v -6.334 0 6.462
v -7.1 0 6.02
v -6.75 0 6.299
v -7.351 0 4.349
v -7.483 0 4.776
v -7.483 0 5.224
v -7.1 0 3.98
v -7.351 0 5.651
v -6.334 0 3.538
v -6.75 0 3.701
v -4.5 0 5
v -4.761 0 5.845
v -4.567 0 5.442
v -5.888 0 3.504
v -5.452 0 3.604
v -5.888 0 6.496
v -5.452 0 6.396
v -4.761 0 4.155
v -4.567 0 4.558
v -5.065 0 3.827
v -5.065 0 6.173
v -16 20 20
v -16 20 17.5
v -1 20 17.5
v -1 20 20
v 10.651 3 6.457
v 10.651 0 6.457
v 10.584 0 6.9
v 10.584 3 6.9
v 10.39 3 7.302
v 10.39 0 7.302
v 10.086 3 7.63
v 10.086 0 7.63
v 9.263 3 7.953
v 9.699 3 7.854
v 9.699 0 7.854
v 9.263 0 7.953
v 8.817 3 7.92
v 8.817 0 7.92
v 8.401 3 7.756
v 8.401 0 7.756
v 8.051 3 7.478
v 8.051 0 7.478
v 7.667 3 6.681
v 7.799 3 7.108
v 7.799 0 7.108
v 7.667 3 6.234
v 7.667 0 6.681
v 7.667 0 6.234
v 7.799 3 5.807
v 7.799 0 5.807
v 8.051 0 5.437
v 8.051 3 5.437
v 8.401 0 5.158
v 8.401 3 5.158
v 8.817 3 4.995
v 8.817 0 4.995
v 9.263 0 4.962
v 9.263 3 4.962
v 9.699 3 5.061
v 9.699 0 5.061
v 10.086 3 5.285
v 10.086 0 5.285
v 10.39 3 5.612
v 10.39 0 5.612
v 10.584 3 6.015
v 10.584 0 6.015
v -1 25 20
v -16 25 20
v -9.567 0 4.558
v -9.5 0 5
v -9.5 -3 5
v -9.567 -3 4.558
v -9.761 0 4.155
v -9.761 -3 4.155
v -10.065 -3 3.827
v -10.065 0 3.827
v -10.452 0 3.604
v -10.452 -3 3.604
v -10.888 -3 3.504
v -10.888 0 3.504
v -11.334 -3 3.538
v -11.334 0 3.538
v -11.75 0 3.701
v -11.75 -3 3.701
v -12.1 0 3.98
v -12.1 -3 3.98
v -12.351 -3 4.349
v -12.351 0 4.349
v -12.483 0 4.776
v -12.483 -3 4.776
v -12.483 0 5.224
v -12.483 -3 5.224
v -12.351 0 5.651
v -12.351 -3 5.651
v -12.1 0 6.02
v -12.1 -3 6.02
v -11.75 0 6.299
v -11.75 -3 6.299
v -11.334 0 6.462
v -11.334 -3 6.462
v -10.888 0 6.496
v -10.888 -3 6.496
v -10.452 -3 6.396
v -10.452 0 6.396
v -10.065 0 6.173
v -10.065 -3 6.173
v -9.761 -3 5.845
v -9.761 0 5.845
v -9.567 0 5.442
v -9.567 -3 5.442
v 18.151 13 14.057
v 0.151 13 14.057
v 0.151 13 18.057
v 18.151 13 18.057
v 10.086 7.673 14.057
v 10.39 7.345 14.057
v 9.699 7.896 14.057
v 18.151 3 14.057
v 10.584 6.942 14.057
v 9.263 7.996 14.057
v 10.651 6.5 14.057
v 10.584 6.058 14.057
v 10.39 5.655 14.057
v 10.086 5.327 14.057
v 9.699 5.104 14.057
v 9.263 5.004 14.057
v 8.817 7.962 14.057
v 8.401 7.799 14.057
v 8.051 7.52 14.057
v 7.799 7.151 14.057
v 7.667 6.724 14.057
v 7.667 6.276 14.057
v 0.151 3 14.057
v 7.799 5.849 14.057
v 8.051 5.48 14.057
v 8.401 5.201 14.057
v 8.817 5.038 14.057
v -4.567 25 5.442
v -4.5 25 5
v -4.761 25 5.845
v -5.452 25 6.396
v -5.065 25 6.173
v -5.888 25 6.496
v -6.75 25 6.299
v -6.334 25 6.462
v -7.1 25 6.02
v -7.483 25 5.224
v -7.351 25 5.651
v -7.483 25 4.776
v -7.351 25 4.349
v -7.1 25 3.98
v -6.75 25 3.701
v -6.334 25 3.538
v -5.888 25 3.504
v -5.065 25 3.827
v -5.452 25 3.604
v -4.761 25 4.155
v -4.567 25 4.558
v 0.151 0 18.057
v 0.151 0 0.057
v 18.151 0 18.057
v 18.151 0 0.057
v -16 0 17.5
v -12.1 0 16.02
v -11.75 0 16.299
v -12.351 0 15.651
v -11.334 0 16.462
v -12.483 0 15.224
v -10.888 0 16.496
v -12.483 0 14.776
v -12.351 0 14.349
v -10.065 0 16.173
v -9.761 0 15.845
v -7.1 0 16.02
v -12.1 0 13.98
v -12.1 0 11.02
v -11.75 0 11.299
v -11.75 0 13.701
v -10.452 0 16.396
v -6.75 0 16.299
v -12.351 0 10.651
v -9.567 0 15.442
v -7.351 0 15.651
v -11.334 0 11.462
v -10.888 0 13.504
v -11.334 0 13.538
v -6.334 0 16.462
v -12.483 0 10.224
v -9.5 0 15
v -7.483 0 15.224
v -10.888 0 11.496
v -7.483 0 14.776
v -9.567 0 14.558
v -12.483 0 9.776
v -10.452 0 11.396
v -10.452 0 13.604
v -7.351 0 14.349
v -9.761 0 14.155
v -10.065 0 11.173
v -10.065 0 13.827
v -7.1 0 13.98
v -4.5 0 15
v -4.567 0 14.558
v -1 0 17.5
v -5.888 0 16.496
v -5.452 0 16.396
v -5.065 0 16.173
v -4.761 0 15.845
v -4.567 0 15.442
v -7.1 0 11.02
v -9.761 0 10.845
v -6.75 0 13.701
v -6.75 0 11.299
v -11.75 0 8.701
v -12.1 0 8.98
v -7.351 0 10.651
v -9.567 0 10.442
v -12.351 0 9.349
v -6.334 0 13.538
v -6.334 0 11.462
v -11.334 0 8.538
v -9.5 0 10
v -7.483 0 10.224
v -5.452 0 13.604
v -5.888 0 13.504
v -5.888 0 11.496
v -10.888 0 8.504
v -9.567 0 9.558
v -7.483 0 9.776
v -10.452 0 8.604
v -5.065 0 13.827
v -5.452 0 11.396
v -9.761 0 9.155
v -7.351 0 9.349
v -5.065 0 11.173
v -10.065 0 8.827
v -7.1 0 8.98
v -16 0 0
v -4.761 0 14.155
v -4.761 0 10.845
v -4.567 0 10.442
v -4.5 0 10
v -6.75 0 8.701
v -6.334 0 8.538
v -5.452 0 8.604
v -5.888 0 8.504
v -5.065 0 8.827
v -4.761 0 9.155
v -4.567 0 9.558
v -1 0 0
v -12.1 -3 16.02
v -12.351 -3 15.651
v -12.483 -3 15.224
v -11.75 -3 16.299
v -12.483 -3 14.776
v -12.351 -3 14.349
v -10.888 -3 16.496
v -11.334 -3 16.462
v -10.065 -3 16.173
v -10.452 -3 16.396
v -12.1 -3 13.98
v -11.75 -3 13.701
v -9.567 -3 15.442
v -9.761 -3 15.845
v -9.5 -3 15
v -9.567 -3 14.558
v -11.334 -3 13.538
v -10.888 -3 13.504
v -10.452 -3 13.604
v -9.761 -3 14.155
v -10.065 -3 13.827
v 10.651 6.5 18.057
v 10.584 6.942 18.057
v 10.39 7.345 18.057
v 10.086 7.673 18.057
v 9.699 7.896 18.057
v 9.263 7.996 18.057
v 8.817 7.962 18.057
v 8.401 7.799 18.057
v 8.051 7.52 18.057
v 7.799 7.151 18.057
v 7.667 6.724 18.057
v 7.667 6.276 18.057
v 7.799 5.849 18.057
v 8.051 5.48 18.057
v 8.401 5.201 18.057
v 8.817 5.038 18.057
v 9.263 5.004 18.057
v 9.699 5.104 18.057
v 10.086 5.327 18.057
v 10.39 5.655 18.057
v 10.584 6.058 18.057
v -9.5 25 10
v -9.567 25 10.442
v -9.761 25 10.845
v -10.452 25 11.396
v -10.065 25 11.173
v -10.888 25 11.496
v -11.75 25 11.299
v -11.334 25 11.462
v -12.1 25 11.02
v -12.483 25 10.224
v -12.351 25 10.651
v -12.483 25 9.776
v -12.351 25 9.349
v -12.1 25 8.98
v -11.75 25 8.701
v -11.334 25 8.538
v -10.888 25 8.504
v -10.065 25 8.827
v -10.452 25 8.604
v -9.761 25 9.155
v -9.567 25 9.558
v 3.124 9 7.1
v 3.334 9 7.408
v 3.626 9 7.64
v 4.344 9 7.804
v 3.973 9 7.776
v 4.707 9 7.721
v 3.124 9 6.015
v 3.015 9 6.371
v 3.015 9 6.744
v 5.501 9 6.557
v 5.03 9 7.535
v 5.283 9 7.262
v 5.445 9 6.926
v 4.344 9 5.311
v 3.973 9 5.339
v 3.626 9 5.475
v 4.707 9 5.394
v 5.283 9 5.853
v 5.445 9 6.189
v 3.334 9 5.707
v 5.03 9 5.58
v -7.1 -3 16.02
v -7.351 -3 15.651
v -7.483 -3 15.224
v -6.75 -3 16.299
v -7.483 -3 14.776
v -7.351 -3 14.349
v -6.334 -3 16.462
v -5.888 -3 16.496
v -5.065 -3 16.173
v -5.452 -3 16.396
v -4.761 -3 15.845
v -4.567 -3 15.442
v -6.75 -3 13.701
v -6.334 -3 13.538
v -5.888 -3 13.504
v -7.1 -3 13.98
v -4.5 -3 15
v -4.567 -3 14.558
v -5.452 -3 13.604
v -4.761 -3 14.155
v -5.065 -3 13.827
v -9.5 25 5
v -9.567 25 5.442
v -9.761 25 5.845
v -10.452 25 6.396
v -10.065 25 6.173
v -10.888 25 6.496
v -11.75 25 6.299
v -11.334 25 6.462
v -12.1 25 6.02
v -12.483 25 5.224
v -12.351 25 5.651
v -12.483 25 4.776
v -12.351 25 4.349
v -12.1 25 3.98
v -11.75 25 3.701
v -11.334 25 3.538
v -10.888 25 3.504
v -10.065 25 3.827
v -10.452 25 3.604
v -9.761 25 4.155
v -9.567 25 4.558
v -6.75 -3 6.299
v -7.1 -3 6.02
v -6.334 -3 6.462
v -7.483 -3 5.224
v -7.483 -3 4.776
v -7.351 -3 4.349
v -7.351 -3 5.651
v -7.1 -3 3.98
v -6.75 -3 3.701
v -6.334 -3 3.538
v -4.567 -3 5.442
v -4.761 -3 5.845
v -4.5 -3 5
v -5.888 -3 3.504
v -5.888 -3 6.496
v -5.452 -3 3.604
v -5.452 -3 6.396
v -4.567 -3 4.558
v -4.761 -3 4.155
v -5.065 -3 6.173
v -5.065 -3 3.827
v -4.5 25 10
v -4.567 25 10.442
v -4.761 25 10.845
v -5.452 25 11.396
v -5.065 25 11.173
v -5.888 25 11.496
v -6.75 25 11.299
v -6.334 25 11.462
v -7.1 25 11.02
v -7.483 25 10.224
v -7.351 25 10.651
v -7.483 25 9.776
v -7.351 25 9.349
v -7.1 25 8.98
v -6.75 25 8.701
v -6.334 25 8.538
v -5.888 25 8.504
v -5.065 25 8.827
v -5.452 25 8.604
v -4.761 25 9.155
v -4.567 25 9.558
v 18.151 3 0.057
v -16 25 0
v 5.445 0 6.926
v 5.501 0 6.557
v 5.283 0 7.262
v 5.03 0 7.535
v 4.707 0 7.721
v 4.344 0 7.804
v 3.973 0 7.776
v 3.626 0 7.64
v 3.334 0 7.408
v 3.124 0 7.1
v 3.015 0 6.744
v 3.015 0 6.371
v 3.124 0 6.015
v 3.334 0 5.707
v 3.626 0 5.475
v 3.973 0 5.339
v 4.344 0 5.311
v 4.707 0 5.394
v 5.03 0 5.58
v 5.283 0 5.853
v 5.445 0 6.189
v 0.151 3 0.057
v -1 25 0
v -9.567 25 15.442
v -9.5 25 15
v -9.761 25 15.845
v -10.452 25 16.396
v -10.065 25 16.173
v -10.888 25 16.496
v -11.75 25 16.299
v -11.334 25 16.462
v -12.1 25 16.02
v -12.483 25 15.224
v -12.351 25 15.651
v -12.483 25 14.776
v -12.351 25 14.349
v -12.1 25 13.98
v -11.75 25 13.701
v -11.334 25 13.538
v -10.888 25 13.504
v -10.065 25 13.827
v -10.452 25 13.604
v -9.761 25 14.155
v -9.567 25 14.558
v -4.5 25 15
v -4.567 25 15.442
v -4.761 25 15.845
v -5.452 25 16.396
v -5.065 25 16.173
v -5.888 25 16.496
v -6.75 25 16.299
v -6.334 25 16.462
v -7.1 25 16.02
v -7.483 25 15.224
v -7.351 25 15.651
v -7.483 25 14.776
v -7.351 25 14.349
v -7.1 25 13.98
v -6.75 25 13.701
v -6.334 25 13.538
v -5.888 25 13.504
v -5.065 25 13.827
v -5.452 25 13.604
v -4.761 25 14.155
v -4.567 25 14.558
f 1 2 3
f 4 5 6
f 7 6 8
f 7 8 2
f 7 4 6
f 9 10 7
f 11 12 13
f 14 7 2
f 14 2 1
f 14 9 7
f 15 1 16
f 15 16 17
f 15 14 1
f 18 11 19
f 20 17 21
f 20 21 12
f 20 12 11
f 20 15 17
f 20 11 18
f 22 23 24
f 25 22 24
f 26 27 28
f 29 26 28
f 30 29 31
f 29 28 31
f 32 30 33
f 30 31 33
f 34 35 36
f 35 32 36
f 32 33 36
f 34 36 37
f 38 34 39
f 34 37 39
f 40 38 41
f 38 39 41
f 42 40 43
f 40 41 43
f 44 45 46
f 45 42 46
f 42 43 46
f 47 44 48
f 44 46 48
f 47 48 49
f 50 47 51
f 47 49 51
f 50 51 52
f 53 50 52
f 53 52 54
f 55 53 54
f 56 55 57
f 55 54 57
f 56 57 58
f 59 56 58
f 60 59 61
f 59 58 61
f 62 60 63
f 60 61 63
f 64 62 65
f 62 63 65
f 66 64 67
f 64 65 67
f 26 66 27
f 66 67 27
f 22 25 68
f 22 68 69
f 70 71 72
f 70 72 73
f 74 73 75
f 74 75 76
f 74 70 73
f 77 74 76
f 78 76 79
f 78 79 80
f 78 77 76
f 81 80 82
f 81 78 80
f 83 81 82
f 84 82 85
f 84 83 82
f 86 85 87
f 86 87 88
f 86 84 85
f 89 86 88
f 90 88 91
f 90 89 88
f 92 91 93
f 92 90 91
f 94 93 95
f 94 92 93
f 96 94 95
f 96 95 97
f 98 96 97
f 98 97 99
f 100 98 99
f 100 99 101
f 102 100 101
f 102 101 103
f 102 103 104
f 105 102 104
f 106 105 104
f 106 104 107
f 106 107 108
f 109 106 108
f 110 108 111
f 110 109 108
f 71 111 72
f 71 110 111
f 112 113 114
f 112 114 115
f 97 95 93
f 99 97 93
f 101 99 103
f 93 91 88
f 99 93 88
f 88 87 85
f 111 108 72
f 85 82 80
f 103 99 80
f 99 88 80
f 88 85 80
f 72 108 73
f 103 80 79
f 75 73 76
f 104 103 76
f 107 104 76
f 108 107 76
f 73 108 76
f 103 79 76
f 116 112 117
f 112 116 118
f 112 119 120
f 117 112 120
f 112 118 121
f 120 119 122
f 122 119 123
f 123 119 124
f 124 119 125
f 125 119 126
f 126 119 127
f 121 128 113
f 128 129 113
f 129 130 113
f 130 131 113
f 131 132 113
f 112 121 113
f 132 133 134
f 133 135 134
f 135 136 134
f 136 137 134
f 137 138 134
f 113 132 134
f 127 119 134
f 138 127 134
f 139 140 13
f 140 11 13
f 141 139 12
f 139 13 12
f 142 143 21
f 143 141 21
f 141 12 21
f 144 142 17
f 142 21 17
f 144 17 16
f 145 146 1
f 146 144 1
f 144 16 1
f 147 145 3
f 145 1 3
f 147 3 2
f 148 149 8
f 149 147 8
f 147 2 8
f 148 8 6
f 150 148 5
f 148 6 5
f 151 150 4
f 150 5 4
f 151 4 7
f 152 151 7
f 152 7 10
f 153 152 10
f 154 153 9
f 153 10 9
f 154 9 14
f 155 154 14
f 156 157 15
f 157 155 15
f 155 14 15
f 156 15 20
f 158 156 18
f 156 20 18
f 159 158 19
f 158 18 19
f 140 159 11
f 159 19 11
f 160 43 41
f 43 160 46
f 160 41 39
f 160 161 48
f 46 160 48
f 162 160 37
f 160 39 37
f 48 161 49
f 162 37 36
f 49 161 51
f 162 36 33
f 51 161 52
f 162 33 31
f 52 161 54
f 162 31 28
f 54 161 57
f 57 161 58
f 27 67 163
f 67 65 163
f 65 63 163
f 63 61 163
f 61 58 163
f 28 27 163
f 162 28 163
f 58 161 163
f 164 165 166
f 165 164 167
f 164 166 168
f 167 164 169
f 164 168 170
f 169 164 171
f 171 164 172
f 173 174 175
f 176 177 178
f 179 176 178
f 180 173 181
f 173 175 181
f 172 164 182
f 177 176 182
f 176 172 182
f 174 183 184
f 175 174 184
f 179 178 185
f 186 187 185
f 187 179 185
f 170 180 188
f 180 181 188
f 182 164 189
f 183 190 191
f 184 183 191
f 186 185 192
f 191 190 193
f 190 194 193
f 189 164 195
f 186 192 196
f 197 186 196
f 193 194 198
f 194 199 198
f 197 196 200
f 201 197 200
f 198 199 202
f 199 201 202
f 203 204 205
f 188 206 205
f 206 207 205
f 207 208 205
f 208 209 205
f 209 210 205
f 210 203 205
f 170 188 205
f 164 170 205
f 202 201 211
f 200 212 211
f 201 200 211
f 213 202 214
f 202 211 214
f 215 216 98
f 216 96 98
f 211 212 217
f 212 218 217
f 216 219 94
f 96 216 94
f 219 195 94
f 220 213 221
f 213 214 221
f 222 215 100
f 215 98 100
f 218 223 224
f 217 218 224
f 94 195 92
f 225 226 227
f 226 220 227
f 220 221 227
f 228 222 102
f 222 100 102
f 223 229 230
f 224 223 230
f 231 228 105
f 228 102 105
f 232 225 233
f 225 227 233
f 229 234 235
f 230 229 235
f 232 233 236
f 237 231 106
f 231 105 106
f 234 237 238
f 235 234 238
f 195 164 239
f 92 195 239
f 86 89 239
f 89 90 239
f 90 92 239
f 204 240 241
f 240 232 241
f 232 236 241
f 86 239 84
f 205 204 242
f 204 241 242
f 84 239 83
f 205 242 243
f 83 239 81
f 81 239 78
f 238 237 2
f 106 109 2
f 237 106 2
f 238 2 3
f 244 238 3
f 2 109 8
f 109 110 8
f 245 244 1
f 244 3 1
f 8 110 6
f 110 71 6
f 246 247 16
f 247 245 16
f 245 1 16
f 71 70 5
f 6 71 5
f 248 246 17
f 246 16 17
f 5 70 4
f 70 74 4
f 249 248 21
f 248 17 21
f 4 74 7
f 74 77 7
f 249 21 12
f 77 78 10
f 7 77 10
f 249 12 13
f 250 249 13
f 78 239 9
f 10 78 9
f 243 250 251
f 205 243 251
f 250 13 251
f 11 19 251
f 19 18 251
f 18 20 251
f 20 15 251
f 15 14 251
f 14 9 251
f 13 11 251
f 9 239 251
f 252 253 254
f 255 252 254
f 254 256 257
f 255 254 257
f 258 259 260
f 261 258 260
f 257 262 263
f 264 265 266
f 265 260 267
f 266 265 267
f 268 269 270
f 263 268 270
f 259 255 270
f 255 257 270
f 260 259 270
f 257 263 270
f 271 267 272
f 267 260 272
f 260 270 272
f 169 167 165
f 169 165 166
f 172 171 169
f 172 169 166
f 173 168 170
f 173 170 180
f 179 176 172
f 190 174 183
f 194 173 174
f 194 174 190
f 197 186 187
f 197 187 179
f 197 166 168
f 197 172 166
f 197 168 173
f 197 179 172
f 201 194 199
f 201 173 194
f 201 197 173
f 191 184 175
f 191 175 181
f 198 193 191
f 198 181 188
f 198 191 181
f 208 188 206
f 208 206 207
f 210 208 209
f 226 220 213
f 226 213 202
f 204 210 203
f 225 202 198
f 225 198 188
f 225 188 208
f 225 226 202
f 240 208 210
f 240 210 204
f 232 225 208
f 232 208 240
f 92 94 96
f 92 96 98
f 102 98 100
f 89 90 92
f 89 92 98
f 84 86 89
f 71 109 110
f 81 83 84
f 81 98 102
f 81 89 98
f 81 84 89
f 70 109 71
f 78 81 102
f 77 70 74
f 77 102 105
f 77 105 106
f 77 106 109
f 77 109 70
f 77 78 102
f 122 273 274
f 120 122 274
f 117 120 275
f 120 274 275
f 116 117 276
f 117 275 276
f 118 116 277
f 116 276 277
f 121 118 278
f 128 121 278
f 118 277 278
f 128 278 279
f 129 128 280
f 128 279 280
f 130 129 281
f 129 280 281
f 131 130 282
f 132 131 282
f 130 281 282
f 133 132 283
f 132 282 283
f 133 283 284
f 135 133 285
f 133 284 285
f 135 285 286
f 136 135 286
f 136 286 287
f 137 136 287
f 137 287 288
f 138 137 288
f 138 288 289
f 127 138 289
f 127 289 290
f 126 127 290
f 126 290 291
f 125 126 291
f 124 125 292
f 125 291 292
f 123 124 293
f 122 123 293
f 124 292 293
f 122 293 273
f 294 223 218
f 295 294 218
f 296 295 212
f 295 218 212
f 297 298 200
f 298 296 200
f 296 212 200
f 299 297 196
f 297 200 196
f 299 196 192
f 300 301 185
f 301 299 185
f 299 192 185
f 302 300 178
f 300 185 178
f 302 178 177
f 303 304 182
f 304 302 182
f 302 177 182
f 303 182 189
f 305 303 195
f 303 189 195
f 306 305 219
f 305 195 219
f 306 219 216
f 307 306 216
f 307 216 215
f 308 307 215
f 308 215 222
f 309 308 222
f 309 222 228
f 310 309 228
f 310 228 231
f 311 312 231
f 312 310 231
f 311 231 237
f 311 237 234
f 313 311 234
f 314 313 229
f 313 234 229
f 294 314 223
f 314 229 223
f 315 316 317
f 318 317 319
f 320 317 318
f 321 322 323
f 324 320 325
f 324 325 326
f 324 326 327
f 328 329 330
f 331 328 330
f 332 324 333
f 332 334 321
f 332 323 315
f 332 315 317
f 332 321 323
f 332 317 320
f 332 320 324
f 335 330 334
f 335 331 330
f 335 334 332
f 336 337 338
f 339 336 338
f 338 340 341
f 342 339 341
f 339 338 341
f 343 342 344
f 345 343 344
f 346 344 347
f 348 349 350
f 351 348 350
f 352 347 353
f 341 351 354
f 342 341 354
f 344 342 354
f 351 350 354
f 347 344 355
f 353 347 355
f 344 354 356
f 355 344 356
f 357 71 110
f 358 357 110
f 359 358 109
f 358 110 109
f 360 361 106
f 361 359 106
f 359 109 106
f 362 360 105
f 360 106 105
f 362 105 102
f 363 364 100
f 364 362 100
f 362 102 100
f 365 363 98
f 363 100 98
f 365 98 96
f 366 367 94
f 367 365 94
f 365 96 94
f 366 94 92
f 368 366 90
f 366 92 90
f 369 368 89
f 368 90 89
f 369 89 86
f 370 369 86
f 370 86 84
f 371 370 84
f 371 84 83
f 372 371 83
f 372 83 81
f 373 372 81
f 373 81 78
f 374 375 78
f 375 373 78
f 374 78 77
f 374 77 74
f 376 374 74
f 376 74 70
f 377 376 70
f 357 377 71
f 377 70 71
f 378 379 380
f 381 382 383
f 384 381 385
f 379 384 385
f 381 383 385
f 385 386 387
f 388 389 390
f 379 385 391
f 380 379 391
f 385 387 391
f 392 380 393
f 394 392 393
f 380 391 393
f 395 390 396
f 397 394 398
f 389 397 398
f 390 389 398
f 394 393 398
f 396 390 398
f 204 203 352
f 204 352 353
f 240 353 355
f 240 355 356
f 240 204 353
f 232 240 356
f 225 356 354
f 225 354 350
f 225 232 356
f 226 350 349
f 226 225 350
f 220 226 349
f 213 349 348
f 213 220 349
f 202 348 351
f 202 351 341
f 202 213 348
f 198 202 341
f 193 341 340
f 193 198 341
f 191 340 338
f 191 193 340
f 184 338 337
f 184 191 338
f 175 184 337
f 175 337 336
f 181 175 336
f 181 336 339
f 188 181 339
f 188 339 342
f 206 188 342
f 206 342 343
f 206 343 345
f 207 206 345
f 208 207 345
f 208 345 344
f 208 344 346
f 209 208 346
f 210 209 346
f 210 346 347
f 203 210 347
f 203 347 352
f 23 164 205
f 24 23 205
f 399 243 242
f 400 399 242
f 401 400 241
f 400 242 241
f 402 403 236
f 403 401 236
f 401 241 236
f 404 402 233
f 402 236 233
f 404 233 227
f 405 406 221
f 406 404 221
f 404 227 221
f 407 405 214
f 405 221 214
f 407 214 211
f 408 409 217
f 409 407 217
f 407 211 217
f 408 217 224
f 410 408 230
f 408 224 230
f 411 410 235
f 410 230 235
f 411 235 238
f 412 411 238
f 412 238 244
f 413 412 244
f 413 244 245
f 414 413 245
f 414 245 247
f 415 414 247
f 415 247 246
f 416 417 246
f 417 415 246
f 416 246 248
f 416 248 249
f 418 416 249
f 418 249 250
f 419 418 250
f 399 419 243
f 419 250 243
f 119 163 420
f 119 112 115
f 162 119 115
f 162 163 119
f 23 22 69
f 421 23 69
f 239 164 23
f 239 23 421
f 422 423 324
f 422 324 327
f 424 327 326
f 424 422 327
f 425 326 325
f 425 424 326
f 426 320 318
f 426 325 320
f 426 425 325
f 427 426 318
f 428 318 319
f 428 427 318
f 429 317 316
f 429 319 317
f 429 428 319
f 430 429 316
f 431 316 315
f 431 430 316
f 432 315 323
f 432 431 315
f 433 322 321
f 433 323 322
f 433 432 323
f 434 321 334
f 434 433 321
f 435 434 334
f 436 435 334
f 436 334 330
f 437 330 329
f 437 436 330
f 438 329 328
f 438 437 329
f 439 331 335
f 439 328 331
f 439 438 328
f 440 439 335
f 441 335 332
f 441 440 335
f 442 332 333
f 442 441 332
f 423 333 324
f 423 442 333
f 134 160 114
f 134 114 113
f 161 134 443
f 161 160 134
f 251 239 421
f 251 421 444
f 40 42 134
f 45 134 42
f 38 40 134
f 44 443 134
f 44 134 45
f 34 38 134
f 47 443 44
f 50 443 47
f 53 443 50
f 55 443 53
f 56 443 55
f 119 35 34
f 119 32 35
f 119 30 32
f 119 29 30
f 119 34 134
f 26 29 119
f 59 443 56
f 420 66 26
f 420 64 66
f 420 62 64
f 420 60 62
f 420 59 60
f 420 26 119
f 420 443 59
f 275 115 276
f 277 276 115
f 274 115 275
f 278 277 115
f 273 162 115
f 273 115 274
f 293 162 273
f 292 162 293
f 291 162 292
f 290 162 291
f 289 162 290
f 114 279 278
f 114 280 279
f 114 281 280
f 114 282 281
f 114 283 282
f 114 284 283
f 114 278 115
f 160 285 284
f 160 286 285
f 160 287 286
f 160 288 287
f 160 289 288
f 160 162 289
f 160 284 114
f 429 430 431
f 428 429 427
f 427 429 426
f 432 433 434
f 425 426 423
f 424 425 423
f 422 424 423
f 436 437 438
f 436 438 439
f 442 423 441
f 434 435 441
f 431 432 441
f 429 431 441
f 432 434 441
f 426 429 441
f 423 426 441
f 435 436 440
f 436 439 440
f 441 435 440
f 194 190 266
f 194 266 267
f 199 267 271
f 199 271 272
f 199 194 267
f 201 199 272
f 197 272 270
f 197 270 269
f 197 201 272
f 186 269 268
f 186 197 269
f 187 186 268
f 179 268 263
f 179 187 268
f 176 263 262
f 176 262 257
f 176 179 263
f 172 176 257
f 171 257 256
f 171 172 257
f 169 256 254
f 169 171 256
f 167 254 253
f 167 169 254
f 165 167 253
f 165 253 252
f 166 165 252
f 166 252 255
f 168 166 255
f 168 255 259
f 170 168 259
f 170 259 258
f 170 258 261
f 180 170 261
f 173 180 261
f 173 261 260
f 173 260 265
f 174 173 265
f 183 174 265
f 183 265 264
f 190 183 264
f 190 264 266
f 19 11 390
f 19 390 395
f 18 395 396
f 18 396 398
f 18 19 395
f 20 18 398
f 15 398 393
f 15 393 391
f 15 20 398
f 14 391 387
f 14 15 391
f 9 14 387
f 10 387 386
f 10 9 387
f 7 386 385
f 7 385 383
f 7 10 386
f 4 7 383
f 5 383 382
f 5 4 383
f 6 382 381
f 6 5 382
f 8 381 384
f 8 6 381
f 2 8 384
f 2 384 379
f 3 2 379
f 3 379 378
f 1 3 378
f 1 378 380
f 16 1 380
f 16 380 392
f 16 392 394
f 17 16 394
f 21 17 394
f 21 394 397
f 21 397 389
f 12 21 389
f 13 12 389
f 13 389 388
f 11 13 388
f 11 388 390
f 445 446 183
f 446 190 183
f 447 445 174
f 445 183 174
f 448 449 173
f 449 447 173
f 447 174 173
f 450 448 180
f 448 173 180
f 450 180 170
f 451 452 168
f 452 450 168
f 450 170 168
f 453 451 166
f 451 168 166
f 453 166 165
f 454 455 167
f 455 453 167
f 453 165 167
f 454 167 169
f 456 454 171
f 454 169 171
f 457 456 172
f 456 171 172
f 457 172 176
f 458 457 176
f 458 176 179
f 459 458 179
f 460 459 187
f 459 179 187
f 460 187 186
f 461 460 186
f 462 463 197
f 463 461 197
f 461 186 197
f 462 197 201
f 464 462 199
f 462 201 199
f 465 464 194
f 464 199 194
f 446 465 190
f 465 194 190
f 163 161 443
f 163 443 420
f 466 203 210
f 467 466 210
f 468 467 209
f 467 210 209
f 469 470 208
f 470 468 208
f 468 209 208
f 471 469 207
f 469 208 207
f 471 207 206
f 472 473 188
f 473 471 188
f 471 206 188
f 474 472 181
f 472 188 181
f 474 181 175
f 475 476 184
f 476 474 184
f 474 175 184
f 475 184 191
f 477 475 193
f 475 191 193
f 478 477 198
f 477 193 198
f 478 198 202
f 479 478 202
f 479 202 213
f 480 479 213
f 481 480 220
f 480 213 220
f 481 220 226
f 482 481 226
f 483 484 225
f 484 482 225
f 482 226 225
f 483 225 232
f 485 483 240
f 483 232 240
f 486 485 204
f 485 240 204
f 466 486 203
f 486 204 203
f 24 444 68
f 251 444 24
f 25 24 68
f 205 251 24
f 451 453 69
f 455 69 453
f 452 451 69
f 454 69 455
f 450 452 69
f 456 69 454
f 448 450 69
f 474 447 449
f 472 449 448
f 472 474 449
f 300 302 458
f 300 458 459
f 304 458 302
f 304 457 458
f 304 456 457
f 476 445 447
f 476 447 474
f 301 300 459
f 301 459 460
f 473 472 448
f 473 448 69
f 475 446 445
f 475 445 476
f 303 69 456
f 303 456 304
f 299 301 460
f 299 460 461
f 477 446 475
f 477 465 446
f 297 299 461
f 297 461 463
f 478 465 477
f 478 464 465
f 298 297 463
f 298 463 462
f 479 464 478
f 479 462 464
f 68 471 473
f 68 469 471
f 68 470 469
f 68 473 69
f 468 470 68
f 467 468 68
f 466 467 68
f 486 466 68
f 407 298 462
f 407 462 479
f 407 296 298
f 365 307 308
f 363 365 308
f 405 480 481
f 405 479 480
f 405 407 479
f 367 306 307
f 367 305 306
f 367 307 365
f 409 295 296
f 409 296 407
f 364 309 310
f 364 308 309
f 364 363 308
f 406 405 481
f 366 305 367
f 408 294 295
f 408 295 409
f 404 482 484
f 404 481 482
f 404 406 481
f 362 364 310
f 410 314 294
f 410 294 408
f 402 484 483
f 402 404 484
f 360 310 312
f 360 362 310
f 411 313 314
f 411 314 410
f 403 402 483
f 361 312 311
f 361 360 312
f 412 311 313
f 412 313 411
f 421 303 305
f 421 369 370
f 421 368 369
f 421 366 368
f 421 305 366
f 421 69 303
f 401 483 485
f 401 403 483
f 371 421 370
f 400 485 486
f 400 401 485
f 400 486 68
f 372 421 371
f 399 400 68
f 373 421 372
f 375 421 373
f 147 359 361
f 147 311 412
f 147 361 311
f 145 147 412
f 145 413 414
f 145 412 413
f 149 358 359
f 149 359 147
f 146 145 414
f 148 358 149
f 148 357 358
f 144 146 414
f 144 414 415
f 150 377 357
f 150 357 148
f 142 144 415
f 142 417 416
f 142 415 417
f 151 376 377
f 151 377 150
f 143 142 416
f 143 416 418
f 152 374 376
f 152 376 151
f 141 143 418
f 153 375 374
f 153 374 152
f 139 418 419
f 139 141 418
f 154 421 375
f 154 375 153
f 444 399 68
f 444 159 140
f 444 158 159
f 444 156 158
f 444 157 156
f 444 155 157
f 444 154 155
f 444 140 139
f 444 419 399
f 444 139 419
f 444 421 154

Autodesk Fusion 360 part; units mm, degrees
sketch "Sketch1" plane through (0, 0, 0) normal (0, 1, 0) x (1, 0, 0)
  line L0 (0.1507, -0.0574) -> (18.1507, -0.0574)
  line L1 (18.1507, -0.0574) -> (18.1507, -18.0574)
  line L2 (18.1507, -18.0574) -> (0.1507, -18.0574)
  line L3 (0.1507, -18.0574) -> (0.1507, -0.0574)
  circle A0 centre (9.1507, -6.4574) radius 1.5
  line L4 (0.1507, -18.0574) -> (18.1507, -18.0574)
  line L5 (18.1507, -18.0574) -> (18.1507, -14.0574)
  line L6 (18.1507, -14.0574) -> (0.1507, -14.0574)
  line L7 (0.1507, -14.0574) -> (0.1507, -18.0574)
  circle A1 centre (4.2507, -6.5574) radius 1.25
  dimension "d4" = 18
  dimension "d5" = 18
  dimension "d6" = 3
  dimension "d7" = 9
  dimension "d9" = 4
  dimension "d27" = 2.5
  dimension "d28" = 4.9
  dimension "d35" = 7.6
  dimension "d36" = 7.5
extrude "Extrude1" add sketch "Sketch1" along normal blind 3 contours L0 L1 L3 L6 | A1 makes body 1
extrude "Extrude2" add sketch "Sketch1" along normal blind 13 contours L1 L2 L3 L4 L5 L6 L7 bodies 1
sketch "Sketch2" plane through (0, 0, 18.0574) normal (0, 0, 1) x (1, 0, 0)
  line L0 (0.1507, 0) -> (18.1507, 0)
  line L1 (18.1507, 0) -> (18.1507, 13)
  line L2 (18.1507, 13) -> (0.1507, 13)
  line L3 (0.1507, 13) -> (0.1507, 0)
  circle A0 centre (9.1507, 6.5) radius 1.5
  point P0 (9.1507, 0)
  dimension "d25" = 6.5
  dimension "d26" = 7
  dimension "d33" = 3
extrude "Extrude4" cut sketch "Sketch2" along normal mid plane 20 contours A0 bodies 1
extrude "Extrude6" add sketch "Sketch1" along normal blind 9 separate body contours A1 makes body 2
sketch "Sketch3" plane through (0, 0, 0) normal (0, 1, 0) x (1, 0, 0)
  line L0 (-16, 0) -> (-1, 0)
  line L1 (-1, 0) -> (-1, -20)
  line L2 (-1, -20) -> (-16, -20)
  line L3 (-16, -20) -> (-16, 0)
  circle A0 centre (-11, -5) radius 1.5
  circle A1 centre (-6, -5) radius 1.5
  circle A2 centre (-11, -10) radius 1.5
  circle A3 centre (-6, -10) radius 1.5
  circle A4 centre (-11, -15) radius 1.5
  circle A5 centre (-6, -15) radius 1.5
  line L4 (-16, -17.5) -> (-1, -17.5)
  line L5 (-1, -17.5) -> (-1, -20)
  line L6 (-1, -20) -> (-16, -20)
  line L7 (-16, -20) -> (-16, -17.5)
  dimension "d37" = 15
  dimension "d38" = 20
  dimension "d39" = 3
  dimension "d40" = 5
  dimension "d41" = 5
  dimension "d42" = 3
  dimension "d43" = 5
  dimension "d44" = 3
  dimension "d45" = 3
  dimension "d46" = 5
  dimension "d47" = 5
  dimension "d48" = 5
  dimension "d49" = 5
  dimension "d50" = 3
  dimension "d51" = 3
  dimension "d52" = 5
  dimension "d53" = 5
  dimension "d54" = 5
  dimension "d55" = 5
  dimension "d56" = 5
  dimension "d57" = 7.5
extrude "Extrude7" add sketch "Sketch3" along normal blind 25 separate body contours L0 L1 L3 L4 makes body 3
extrude "Extrude8" add sketch "Sketch3" along normal blind 5 from surface at 20 contours L1 L2 L3 L4 L5 L6 L7 bodies 3
extrude "Extrude9" add sketch "Sketch3" against normal blind 3 separate body contours A0 | A1 | A4 | A5 makes body 4 at (-4.5019, -2, 5.0748) makes body 5 at (-4.5019, -2, 15.0748) makes body 6 at (-9.5019, -2, 5.0748) makes body 7 at (-9.5019, -2, 15.0748)
copy_body "CutPasteBodies1" bodies 3 4 5 6 7 removing the originals makes body 8 makes body 9 makes body 10 makes body 11 makes body 12 in component "Component"
component "Component" placed x (1, 0, 0) y (0, 1, 0) z (0, 0, 1) at (0, 0, 0)
